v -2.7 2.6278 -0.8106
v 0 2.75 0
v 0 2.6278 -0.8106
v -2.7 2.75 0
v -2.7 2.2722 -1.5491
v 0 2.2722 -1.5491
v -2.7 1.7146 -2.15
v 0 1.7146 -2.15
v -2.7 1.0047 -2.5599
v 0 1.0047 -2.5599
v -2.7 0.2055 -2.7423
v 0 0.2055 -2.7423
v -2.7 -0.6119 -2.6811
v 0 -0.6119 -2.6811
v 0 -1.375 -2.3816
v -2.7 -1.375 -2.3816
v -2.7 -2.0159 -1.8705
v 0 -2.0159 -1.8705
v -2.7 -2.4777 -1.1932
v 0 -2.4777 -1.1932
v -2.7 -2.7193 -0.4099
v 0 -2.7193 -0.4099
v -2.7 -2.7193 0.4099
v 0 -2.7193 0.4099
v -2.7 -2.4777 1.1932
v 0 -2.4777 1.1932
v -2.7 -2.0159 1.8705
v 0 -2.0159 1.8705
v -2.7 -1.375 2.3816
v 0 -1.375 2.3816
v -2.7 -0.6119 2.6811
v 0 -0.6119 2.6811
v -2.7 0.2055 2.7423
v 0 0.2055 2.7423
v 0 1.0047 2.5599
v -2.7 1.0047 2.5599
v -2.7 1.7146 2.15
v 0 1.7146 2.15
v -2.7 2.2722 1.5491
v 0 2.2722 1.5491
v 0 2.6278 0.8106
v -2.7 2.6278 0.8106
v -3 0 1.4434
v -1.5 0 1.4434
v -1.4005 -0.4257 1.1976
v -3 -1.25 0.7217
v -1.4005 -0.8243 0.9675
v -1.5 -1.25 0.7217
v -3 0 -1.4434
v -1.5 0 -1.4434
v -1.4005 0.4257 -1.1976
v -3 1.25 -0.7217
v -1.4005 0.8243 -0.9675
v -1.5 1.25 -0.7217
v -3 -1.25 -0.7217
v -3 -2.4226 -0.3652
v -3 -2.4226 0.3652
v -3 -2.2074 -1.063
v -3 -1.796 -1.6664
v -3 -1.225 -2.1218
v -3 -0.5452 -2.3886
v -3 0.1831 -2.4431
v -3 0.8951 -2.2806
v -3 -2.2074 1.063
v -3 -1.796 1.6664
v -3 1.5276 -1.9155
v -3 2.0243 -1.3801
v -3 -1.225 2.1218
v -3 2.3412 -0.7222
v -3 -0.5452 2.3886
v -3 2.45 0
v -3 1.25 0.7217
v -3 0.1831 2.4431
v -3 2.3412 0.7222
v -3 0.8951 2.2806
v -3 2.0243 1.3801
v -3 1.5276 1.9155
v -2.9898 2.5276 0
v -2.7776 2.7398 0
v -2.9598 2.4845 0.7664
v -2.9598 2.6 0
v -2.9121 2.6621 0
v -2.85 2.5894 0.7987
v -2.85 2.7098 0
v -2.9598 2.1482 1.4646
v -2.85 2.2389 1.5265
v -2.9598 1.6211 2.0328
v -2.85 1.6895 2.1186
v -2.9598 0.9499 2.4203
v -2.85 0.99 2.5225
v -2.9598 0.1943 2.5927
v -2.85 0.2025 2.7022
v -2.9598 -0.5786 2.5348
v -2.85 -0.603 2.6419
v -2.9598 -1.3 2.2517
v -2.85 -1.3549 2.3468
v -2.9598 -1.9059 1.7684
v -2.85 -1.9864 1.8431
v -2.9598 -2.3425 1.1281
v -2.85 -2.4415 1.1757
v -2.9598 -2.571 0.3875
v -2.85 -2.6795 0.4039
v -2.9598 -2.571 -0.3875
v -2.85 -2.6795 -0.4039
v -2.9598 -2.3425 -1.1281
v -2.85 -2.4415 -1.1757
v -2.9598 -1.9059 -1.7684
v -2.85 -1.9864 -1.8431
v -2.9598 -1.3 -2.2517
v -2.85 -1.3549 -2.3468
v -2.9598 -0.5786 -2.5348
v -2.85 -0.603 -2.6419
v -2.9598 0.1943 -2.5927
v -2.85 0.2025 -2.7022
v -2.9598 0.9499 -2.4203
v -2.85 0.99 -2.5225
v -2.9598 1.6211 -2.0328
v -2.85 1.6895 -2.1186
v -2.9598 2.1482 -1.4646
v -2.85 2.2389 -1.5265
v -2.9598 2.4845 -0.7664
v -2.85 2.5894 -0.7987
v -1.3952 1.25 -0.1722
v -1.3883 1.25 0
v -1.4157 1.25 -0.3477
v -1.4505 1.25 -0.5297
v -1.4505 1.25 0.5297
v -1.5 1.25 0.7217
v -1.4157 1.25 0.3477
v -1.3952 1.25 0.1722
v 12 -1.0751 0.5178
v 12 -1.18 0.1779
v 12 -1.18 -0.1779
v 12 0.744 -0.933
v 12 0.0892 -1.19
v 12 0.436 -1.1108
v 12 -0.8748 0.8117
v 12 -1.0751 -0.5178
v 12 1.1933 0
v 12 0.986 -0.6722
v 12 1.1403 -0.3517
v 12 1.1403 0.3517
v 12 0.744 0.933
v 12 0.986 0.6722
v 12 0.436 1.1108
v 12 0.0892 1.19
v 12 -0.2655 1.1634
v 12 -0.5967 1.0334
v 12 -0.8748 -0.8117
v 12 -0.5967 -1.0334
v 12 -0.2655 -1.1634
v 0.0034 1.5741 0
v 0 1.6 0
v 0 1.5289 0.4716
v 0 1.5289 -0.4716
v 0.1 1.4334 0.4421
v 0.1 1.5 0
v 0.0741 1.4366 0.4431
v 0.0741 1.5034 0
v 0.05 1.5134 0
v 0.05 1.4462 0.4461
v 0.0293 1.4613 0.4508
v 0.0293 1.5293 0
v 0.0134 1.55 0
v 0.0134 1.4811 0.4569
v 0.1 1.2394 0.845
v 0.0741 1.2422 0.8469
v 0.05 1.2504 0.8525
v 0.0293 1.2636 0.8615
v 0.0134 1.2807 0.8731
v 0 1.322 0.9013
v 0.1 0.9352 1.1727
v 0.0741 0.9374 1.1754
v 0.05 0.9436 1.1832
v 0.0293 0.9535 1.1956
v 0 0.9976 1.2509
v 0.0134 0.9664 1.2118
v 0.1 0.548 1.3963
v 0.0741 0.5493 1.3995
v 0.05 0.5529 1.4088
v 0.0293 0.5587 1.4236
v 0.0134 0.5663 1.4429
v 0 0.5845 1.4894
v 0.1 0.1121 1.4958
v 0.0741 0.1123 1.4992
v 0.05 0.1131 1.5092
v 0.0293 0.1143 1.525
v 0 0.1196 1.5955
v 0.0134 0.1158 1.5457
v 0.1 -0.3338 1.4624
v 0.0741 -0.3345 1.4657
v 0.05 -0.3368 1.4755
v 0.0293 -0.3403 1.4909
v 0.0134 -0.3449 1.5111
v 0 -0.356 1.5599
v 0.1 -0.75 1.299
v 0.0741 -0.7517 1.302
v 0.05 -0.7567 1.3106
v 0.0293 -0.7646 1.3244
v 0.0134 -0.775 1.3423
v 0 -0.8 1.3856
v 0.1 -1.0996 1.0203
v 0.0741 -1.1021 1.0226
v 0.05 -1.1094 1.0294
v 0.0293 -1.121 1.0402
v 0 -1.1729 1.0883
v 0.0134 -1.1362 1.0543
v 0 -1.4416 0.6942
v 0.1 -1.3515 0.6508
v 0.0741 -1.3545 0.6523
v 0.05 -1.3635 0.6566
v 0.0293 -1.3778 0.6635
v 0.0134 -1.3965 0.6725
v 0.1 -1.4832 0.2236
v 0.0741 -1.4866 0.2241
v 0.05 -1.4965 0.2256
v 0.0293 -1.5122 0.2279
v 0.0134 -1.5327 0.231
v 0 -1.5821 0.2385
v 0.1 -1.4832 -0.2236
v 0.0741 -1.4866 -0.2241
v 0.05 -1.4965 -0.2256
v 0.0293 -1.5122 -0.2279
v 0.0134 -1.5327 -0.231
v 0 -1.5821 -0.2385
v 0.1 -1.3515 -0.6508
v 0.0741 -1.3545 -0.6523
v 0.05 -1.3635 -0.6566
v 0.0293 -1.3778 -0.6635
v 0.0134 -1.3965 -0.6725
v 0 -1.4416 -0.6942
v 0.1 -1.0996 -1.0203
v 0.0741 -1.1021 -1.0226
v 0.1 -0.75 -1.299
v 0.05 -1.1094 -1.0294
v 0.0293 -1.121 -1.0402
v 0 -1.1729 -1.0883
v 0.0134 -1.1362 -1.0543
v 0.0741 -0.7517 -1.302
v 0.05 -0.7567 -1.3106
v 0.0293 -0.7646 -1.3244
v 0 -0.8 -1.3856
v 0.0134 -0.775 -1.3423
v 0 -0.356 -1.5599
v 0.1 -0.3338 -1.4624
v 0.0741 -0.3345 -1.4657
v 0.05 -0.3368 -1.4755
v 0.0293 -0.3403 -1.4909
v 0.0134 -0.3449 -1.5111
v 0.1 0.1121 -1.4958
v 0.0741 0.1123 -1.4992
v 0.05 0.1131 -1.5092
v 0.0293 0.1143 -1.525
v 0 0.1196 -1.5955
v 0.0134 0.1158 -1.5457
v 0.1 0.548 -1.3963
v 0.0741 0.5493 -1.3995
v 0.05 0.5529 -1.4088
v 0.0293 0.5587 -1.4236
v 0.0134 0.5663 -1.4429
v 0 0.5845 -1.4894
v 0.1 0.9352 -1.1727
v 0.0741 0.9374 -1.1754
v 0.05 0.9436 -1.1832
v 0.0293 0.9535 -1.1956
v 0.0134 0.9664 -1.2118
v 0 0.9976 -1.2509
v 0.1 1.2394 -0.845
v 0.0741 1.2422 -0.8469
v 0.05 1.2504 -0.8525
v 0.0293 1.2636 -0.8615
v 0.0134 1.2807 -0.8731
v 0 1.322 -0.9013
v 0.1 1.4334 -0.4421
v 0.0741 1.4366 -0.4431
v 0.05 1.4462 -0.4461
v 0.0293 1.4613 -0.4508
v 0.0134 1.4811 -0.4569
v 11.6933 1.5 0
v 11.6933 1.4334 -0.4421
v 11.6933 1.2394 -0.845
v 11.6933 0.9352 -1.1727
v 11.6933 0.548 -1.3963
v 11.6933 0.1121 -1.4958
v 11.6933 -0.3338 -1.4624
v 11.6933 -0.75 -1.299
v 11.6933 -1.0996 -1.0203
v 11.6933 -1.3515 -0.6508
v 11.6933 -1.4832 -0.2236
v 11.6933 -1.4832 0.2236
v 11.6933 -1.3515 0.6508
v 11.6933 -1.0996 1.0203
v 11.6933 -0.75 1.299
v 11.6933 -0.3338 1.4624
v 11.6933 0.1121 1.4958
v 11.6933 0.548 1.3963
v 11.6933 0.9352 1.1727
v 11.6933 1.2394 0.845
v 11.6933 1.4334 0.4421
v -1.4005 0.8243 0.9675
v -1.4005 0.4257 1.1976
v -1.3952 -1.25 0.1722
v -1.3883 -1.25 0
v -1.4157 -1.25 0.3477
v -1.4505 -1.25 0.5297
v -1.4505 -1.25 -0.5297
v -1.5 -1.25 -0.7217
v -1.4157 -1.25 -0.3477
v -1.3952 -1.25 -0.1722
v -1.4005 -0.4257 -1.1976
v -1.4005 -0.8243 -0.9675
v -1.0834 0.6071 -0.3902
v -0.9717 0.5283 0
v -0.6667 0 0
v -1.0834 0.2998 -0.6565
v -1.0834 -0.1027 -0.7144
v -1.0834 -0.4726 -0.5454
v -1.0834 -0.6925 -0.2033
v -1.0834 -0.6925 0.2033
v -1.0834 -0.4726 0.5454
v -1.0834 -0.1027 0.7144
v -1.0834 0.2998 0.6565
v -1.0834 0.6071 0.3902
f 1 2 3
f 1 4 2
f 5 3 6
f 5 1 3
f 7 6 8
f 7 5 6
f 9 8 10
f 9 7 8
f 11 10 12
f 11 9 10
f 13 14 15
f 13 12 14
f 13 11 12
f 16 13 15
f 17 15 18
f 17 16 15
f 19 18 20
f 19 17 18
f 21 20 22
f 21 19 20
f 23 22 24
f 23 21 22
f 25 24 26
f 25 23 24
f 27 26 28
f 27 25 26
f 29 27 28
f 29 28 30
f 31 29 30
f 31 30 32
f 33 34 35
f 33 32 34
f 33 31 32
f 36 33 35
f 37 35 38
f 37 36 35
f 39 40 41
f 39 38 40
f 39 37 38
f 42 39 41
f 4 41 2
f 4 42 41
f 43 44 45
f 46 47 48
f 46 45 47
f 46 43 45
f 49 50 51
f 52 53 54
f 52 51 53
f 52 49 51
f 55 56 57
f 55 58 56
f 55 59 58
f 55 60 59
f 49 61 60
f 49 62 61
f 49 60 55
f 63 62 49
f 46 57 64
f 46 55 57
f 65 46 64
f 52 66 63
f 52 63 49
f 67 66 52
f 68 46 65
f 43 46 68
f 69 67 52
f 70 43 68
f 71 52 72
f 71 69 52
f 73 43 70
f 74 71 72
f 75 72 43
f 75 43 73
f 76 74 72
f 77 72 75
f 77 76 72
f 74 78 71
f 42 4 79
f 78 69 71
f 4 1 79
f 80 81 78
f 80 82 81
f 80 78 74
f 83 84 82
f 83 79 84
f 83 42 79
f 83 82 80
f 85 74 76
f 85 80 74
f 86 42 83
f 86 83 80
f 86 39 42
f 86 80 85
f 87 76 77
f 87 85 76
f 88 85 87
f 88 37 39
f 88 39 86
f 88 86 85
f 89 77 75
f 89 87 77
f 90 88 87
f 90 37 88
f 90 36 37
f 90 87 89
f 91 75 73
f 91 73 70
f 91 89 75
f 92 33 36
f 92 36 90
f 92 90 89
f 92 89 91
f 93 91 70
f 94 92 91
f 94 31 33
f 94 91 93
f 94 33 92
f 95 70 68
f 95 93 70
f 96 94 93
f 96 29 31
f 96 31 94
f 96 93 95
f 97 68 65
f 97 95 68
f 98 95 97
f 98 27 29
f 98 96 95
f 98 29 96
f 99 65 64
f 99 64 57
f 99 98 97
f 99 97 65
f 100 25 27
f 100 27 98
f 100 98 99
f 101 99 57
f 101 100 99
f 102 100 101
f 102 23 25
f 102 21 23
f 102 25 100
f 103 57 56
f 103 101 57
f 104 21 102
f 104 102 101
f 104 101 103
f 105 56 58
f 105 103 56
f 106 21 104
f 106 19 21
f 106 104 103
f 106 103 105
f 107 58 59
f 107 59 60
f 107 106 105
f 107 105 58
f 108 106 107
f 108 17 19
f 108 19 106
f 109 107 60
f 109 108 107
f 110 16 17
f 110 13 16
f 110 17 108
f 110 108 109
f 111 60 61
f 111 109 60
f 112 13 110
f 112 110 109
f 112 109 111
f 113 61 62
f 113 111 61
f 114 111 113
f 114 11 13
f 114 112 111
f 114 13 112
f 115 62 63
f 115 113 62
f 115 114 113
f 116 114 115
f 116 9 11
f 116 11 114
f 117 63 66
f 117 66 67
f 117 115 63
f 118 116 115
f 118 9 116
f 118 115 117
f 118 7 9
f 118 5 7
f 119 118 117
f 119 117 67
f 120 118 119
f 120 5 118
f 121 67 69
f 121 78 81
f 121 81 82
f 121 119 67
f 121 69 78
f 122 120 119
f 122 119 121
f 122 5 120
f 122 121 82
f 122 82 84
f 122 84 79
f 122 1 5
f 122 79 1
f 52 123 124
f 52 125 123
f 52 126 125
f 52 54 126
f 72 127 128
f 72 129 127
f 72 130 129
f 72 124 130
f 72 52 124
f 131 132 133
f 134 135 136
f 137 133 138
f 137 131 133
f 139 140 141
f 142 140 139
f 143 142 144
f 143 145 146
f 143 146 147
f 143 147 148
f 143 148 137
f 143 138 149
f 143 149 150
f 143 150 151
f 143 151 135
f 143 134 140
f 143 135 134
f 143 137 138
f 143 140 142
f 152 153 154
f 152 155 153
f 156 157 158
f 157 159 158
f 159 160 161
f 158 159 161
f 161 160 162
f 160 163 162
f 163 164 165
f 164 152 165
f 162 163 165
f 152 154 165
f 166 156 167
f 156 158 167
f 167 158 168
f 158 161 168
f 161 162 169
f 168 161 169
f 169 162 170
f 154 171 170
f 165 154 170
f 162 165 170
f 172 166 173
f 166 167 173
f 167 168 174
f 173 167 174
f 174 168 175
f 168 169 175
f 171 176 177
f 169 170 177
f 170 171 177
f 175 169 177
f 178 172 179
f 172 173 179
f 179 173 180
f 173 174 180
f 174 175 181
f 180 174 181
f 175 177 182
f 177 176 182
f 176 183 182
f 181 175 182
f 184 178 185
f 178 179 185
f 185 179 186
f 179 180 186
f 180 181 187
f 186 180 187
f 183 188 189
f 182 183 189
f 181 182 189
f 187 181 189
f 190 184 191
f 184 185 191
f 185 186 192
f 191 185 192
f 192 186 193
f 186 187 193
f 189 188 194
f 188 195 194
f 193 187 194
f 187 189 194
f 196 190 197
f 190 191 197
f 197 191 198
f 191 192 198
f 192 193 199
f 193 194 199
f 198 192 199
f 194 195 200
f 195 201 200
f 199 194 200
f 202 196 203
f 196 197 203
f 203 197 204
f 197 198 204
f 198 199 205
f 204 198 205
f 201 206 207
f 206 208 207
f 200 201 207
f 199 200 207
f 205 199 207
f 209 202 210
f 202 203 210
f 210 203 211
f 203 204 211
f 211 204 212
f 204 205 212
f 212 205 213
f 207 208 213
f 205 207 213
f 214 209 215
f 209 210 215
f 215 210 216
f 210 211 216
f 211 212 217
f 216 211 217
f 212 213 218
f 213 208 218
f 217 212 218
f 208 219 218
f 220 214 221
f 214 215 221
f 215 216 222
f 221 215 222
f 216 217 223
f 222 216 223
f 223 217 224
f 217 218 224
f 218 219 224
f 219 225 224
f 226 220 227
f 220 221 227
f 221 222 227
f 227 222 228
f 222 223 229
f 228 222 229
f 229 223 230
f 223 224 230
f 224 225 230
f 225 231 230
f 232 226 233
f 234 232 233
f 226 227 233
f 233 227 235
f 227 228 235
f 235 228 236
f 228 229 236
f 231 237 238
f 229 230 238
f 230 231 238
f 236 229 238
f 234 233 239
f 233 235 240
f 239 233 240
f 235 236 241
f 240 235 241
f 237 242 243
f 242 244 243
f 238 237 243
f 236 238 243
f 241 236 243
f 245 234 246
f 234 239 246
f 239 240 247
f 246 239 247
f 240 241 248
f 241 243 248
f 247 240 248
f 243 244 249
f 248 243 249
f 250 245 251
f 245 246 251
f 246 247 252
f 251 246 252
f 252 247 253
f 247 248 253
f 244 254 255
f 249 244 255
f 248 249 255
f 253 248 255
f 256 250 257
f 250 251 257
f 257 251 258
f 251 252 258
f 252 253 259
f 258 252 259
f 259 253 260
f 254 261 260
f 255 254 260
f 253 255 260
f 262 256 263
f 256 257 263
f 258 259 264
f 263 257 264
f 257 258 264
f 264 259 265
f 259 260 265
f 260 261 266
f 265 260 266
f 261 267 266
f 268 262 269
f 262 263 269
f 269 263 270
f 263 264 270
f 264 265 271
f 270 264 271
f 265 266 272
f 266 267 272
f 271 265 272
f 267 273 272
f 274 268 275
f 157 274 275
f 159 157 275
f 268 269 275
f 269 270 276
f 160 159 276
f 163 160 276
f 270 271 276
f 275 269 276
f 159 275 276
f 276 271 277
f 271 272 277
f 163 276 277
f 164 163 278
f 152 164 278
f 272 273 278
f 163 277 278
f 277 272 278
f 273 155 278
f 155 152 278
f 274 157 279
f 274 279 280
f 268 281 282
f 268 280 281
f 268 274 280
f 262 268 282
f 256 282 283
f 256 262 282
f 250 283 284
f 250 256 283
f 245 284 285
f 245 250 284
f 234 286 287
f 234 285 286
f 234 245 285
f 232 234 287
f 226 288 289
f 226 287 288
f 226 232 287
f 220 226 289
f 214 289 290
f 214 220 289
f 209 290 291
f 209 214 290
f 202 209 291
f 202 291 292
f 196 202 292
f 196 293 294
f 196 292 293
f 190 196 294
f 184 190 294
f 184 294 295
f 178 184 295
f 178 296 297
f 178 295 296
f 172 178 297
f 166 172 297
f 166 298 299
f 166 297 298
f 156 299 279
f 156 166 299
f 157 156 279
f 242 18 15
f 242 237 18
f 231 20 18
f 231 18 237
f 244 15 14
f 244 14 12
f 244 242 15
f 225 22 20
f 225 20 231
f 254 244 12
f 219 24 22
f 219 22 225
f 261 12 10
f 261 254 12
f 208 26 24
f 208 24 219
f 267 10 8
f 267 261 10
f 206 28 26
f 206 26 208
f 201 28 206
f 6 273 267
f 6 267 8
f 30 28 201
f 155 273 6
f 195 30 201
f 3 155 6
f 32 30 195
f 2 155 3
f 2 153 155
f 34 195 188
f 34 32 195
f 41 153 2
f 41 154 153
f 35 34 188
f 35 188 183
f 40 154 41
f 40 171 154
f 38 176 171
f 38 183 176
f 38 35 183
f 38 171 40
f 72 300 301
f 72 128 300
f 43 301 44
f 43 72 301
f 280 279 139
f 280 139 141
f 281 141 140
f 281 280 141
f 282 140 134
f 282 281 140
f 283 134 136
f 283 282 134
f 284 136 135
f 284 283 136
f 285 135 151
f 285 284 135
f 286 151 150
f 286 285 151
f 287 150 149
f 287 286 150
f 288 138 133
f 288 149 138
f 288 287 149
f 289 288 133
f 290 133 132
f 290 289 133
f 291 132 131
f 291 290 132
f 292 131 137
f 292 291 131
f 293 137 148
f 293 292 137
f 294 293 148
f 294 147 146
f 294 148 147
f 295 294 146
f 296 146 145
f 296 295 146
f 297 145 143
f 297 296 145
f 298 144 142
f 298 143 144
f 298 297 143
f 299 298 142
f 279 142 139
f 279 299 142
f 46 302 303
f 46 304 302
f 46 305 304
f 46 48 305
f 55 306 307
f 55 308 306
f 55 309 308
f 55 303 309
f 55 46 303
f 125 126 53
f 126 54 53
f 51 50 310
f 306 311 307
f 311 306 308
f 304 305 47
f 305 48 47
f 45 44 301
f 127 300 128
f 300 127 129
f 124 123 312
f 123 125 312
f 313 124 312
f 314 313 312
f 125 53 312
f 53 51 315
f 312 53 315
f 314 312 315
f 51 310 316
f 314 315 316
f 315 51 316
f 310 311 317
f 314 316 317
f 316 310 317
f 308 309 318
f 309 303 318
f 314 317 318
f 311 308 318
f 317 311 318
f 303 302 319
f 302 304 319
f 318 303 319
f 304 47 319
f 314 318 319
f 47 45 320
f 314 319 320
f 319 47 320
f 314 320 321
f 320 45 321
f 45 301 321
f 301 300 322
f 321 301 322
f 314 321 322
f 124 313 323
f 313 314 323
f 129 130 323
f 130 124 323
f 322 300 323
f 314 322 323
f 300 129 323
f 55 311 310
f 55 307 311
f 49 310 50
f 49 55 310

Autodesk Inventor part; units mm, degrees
ref_plane "YZ Plane" through (0, 0, 0) normal (1, 0, 0) x (0, 1, 0)
ref_plane "XZ Plane" through (0, 0, 0) normal (0, 1, 0) x (-1, 0, 0)
sketch "Sketch1" plane through (0, 0, 0) normal (0, 0, 1) x (1, 0, 0)
  line L0 (-0.6667, 0) -> (12, 0)
  line L1 (12, 0) -> (12, 1.5)
  line L2 (12, 1.5) -> (1.3067, 1.5)
  line L3 (1.3067, 1.5) -> (1, 1.5)
  line L4 (1, 1.5) -> (0, 1.5)
  line L5 (0, 1.5) -> (0, 2.75)
  line L6 (0, 2.75) -> (-3, 2.75)
  line L7 (-3, 2.75) -> (-3, 1.4434)
  line L8 (-3, 1.4434) -> (-1.5, 1.4434)
  line L9 (-1.5, 1.4434) -> (-0.6667, 0)
  line L10 (-6, 0) -> (15, 0) projected
  line L11 (0, -0.55) -> (0, 3.3) projected
  line L12 (1.3067, 1.5) -> (0, 1.5) construction
  dimension "d0" = 10.6933
  dimension "d1" = 0.3067
  dimension "d2" = 3
  dimension "d3" = 1.5
  dimension "d4" = 60
  dimension "d5" = 3
  dimension "d6" = 3
  dimension "d7" = 2.8868
  dimension "d8" = 5.5
  dimension "d19" = 12
revolve "Body" add sketch "Sketch1" angle 360 about axis through (-0.6667, 0, 0) along (1, 0, 0)
sketch "Sketch2" plane through (-3, 0, 0) normal (-1, 0, 0) x (0, 0, 1)
  circle A0 centre (0, 0) radius 1.4434 projected
  line L0 (0, -3.85) -> (0, 3.85) projected
  line L1 (-3.85, 0) -> (3.85, 0) projected
  line L2 (1.4434, 0) -> (0.7217, -1.25)
  line L3 (0.7217, -1.25) -> (-0.7217, -1.25)
  line L4 (-0.7217, -1.25) -> (-1.4434, 0)
  line L5 (-1.4434, 0) -> (-0.7217, 1.25)
  line L6 (-0.7217, 1.25) -> (0.7217, 1.25)
  line L7 (0.7217, 1.25) -> (1.4434, 0)
  point P0 (0, 0)
extrude "Slot" add sketch "Sketch2" against normal up to next contours L7 A0 | A0 L2 | L6 L0 A0 | A0 L0 L3 | L0 L6 A0 | A0 L3 L0 | L4 A0 | A0 L5
fillet "Fillet2" radius 0.3 1 edges at (-3, -2.75, 0)
thread "Thread" size "M3x0.5" class "6g" standard "ISO Metric profile" length 10.6933
chamfer "Chamfer1" distance 0.3067 distance2 0.3067 1 edges at (12, -1.5, 0) measured on face at (12, -0.6587, -0.1791)
fillet "Fillet1" radius 0.1 1 edges at (0, -1.5, 0)
ref_plane "Work Plane1" through (30, 0, 0) normal (0, -0.5, 0.866) x (1, 0, 0)
equation "\"d0\" = GEL"
equation "\"d1\" = GAL"
equation "\"d2\" = KOH"
equation "\"d3\" = INTI"
equation "\"d5\" = GD"
equation "\"d6\" = BDM"
equation "\"d7\" = 1.1547 * SW"
equation "\"d8\" = KOD"
equation "\"d19\" = NLG"
equation "\"d16\" = RR"
equation "\"d12\" = GEL"
equation "\"d14\" = -0.5 * SPD + 0.5 * GD"
equation "\"d15\" = GUL"
equation "\"d29\" = R"
equation "\"GD\" = NND"
equation "\"NLG\" = 12"
equation "\"GEL\" = 10.69327"
equation "\"KOD\" = 5.5"
equation "\"KOH\" = 3"
equation "\"INTI\" = 1.5"
equation "\"GAL\" = 0.61345 * PTC"
equation "\"GUL\" = 0.61345 * PTC"
equation "\"BDM\" = NND"
equation "\"SW\" = 2.5"
equation "\"RR\" = 0.3"
equation "\"SPD\" = 2.38655"
equation "\"d28\" = R"
equation "\"R\" = 0.1"
equation "\"TOA\" = 30deg"
equation "\"THREADDIA\" = 3"
equation "\"KOD1\" = KOD"
equation "\"PTC\" = 0.5"
equation "\"NND\" = 3"
equation "\"E0\" = 1.155 * SW"
equation "\"GD1\" = THREADDIA - 1.2269 * PTC"
properties part number "ANSI B18.3.1M - M3x0.5 x 12" material "Steel, Mild"
